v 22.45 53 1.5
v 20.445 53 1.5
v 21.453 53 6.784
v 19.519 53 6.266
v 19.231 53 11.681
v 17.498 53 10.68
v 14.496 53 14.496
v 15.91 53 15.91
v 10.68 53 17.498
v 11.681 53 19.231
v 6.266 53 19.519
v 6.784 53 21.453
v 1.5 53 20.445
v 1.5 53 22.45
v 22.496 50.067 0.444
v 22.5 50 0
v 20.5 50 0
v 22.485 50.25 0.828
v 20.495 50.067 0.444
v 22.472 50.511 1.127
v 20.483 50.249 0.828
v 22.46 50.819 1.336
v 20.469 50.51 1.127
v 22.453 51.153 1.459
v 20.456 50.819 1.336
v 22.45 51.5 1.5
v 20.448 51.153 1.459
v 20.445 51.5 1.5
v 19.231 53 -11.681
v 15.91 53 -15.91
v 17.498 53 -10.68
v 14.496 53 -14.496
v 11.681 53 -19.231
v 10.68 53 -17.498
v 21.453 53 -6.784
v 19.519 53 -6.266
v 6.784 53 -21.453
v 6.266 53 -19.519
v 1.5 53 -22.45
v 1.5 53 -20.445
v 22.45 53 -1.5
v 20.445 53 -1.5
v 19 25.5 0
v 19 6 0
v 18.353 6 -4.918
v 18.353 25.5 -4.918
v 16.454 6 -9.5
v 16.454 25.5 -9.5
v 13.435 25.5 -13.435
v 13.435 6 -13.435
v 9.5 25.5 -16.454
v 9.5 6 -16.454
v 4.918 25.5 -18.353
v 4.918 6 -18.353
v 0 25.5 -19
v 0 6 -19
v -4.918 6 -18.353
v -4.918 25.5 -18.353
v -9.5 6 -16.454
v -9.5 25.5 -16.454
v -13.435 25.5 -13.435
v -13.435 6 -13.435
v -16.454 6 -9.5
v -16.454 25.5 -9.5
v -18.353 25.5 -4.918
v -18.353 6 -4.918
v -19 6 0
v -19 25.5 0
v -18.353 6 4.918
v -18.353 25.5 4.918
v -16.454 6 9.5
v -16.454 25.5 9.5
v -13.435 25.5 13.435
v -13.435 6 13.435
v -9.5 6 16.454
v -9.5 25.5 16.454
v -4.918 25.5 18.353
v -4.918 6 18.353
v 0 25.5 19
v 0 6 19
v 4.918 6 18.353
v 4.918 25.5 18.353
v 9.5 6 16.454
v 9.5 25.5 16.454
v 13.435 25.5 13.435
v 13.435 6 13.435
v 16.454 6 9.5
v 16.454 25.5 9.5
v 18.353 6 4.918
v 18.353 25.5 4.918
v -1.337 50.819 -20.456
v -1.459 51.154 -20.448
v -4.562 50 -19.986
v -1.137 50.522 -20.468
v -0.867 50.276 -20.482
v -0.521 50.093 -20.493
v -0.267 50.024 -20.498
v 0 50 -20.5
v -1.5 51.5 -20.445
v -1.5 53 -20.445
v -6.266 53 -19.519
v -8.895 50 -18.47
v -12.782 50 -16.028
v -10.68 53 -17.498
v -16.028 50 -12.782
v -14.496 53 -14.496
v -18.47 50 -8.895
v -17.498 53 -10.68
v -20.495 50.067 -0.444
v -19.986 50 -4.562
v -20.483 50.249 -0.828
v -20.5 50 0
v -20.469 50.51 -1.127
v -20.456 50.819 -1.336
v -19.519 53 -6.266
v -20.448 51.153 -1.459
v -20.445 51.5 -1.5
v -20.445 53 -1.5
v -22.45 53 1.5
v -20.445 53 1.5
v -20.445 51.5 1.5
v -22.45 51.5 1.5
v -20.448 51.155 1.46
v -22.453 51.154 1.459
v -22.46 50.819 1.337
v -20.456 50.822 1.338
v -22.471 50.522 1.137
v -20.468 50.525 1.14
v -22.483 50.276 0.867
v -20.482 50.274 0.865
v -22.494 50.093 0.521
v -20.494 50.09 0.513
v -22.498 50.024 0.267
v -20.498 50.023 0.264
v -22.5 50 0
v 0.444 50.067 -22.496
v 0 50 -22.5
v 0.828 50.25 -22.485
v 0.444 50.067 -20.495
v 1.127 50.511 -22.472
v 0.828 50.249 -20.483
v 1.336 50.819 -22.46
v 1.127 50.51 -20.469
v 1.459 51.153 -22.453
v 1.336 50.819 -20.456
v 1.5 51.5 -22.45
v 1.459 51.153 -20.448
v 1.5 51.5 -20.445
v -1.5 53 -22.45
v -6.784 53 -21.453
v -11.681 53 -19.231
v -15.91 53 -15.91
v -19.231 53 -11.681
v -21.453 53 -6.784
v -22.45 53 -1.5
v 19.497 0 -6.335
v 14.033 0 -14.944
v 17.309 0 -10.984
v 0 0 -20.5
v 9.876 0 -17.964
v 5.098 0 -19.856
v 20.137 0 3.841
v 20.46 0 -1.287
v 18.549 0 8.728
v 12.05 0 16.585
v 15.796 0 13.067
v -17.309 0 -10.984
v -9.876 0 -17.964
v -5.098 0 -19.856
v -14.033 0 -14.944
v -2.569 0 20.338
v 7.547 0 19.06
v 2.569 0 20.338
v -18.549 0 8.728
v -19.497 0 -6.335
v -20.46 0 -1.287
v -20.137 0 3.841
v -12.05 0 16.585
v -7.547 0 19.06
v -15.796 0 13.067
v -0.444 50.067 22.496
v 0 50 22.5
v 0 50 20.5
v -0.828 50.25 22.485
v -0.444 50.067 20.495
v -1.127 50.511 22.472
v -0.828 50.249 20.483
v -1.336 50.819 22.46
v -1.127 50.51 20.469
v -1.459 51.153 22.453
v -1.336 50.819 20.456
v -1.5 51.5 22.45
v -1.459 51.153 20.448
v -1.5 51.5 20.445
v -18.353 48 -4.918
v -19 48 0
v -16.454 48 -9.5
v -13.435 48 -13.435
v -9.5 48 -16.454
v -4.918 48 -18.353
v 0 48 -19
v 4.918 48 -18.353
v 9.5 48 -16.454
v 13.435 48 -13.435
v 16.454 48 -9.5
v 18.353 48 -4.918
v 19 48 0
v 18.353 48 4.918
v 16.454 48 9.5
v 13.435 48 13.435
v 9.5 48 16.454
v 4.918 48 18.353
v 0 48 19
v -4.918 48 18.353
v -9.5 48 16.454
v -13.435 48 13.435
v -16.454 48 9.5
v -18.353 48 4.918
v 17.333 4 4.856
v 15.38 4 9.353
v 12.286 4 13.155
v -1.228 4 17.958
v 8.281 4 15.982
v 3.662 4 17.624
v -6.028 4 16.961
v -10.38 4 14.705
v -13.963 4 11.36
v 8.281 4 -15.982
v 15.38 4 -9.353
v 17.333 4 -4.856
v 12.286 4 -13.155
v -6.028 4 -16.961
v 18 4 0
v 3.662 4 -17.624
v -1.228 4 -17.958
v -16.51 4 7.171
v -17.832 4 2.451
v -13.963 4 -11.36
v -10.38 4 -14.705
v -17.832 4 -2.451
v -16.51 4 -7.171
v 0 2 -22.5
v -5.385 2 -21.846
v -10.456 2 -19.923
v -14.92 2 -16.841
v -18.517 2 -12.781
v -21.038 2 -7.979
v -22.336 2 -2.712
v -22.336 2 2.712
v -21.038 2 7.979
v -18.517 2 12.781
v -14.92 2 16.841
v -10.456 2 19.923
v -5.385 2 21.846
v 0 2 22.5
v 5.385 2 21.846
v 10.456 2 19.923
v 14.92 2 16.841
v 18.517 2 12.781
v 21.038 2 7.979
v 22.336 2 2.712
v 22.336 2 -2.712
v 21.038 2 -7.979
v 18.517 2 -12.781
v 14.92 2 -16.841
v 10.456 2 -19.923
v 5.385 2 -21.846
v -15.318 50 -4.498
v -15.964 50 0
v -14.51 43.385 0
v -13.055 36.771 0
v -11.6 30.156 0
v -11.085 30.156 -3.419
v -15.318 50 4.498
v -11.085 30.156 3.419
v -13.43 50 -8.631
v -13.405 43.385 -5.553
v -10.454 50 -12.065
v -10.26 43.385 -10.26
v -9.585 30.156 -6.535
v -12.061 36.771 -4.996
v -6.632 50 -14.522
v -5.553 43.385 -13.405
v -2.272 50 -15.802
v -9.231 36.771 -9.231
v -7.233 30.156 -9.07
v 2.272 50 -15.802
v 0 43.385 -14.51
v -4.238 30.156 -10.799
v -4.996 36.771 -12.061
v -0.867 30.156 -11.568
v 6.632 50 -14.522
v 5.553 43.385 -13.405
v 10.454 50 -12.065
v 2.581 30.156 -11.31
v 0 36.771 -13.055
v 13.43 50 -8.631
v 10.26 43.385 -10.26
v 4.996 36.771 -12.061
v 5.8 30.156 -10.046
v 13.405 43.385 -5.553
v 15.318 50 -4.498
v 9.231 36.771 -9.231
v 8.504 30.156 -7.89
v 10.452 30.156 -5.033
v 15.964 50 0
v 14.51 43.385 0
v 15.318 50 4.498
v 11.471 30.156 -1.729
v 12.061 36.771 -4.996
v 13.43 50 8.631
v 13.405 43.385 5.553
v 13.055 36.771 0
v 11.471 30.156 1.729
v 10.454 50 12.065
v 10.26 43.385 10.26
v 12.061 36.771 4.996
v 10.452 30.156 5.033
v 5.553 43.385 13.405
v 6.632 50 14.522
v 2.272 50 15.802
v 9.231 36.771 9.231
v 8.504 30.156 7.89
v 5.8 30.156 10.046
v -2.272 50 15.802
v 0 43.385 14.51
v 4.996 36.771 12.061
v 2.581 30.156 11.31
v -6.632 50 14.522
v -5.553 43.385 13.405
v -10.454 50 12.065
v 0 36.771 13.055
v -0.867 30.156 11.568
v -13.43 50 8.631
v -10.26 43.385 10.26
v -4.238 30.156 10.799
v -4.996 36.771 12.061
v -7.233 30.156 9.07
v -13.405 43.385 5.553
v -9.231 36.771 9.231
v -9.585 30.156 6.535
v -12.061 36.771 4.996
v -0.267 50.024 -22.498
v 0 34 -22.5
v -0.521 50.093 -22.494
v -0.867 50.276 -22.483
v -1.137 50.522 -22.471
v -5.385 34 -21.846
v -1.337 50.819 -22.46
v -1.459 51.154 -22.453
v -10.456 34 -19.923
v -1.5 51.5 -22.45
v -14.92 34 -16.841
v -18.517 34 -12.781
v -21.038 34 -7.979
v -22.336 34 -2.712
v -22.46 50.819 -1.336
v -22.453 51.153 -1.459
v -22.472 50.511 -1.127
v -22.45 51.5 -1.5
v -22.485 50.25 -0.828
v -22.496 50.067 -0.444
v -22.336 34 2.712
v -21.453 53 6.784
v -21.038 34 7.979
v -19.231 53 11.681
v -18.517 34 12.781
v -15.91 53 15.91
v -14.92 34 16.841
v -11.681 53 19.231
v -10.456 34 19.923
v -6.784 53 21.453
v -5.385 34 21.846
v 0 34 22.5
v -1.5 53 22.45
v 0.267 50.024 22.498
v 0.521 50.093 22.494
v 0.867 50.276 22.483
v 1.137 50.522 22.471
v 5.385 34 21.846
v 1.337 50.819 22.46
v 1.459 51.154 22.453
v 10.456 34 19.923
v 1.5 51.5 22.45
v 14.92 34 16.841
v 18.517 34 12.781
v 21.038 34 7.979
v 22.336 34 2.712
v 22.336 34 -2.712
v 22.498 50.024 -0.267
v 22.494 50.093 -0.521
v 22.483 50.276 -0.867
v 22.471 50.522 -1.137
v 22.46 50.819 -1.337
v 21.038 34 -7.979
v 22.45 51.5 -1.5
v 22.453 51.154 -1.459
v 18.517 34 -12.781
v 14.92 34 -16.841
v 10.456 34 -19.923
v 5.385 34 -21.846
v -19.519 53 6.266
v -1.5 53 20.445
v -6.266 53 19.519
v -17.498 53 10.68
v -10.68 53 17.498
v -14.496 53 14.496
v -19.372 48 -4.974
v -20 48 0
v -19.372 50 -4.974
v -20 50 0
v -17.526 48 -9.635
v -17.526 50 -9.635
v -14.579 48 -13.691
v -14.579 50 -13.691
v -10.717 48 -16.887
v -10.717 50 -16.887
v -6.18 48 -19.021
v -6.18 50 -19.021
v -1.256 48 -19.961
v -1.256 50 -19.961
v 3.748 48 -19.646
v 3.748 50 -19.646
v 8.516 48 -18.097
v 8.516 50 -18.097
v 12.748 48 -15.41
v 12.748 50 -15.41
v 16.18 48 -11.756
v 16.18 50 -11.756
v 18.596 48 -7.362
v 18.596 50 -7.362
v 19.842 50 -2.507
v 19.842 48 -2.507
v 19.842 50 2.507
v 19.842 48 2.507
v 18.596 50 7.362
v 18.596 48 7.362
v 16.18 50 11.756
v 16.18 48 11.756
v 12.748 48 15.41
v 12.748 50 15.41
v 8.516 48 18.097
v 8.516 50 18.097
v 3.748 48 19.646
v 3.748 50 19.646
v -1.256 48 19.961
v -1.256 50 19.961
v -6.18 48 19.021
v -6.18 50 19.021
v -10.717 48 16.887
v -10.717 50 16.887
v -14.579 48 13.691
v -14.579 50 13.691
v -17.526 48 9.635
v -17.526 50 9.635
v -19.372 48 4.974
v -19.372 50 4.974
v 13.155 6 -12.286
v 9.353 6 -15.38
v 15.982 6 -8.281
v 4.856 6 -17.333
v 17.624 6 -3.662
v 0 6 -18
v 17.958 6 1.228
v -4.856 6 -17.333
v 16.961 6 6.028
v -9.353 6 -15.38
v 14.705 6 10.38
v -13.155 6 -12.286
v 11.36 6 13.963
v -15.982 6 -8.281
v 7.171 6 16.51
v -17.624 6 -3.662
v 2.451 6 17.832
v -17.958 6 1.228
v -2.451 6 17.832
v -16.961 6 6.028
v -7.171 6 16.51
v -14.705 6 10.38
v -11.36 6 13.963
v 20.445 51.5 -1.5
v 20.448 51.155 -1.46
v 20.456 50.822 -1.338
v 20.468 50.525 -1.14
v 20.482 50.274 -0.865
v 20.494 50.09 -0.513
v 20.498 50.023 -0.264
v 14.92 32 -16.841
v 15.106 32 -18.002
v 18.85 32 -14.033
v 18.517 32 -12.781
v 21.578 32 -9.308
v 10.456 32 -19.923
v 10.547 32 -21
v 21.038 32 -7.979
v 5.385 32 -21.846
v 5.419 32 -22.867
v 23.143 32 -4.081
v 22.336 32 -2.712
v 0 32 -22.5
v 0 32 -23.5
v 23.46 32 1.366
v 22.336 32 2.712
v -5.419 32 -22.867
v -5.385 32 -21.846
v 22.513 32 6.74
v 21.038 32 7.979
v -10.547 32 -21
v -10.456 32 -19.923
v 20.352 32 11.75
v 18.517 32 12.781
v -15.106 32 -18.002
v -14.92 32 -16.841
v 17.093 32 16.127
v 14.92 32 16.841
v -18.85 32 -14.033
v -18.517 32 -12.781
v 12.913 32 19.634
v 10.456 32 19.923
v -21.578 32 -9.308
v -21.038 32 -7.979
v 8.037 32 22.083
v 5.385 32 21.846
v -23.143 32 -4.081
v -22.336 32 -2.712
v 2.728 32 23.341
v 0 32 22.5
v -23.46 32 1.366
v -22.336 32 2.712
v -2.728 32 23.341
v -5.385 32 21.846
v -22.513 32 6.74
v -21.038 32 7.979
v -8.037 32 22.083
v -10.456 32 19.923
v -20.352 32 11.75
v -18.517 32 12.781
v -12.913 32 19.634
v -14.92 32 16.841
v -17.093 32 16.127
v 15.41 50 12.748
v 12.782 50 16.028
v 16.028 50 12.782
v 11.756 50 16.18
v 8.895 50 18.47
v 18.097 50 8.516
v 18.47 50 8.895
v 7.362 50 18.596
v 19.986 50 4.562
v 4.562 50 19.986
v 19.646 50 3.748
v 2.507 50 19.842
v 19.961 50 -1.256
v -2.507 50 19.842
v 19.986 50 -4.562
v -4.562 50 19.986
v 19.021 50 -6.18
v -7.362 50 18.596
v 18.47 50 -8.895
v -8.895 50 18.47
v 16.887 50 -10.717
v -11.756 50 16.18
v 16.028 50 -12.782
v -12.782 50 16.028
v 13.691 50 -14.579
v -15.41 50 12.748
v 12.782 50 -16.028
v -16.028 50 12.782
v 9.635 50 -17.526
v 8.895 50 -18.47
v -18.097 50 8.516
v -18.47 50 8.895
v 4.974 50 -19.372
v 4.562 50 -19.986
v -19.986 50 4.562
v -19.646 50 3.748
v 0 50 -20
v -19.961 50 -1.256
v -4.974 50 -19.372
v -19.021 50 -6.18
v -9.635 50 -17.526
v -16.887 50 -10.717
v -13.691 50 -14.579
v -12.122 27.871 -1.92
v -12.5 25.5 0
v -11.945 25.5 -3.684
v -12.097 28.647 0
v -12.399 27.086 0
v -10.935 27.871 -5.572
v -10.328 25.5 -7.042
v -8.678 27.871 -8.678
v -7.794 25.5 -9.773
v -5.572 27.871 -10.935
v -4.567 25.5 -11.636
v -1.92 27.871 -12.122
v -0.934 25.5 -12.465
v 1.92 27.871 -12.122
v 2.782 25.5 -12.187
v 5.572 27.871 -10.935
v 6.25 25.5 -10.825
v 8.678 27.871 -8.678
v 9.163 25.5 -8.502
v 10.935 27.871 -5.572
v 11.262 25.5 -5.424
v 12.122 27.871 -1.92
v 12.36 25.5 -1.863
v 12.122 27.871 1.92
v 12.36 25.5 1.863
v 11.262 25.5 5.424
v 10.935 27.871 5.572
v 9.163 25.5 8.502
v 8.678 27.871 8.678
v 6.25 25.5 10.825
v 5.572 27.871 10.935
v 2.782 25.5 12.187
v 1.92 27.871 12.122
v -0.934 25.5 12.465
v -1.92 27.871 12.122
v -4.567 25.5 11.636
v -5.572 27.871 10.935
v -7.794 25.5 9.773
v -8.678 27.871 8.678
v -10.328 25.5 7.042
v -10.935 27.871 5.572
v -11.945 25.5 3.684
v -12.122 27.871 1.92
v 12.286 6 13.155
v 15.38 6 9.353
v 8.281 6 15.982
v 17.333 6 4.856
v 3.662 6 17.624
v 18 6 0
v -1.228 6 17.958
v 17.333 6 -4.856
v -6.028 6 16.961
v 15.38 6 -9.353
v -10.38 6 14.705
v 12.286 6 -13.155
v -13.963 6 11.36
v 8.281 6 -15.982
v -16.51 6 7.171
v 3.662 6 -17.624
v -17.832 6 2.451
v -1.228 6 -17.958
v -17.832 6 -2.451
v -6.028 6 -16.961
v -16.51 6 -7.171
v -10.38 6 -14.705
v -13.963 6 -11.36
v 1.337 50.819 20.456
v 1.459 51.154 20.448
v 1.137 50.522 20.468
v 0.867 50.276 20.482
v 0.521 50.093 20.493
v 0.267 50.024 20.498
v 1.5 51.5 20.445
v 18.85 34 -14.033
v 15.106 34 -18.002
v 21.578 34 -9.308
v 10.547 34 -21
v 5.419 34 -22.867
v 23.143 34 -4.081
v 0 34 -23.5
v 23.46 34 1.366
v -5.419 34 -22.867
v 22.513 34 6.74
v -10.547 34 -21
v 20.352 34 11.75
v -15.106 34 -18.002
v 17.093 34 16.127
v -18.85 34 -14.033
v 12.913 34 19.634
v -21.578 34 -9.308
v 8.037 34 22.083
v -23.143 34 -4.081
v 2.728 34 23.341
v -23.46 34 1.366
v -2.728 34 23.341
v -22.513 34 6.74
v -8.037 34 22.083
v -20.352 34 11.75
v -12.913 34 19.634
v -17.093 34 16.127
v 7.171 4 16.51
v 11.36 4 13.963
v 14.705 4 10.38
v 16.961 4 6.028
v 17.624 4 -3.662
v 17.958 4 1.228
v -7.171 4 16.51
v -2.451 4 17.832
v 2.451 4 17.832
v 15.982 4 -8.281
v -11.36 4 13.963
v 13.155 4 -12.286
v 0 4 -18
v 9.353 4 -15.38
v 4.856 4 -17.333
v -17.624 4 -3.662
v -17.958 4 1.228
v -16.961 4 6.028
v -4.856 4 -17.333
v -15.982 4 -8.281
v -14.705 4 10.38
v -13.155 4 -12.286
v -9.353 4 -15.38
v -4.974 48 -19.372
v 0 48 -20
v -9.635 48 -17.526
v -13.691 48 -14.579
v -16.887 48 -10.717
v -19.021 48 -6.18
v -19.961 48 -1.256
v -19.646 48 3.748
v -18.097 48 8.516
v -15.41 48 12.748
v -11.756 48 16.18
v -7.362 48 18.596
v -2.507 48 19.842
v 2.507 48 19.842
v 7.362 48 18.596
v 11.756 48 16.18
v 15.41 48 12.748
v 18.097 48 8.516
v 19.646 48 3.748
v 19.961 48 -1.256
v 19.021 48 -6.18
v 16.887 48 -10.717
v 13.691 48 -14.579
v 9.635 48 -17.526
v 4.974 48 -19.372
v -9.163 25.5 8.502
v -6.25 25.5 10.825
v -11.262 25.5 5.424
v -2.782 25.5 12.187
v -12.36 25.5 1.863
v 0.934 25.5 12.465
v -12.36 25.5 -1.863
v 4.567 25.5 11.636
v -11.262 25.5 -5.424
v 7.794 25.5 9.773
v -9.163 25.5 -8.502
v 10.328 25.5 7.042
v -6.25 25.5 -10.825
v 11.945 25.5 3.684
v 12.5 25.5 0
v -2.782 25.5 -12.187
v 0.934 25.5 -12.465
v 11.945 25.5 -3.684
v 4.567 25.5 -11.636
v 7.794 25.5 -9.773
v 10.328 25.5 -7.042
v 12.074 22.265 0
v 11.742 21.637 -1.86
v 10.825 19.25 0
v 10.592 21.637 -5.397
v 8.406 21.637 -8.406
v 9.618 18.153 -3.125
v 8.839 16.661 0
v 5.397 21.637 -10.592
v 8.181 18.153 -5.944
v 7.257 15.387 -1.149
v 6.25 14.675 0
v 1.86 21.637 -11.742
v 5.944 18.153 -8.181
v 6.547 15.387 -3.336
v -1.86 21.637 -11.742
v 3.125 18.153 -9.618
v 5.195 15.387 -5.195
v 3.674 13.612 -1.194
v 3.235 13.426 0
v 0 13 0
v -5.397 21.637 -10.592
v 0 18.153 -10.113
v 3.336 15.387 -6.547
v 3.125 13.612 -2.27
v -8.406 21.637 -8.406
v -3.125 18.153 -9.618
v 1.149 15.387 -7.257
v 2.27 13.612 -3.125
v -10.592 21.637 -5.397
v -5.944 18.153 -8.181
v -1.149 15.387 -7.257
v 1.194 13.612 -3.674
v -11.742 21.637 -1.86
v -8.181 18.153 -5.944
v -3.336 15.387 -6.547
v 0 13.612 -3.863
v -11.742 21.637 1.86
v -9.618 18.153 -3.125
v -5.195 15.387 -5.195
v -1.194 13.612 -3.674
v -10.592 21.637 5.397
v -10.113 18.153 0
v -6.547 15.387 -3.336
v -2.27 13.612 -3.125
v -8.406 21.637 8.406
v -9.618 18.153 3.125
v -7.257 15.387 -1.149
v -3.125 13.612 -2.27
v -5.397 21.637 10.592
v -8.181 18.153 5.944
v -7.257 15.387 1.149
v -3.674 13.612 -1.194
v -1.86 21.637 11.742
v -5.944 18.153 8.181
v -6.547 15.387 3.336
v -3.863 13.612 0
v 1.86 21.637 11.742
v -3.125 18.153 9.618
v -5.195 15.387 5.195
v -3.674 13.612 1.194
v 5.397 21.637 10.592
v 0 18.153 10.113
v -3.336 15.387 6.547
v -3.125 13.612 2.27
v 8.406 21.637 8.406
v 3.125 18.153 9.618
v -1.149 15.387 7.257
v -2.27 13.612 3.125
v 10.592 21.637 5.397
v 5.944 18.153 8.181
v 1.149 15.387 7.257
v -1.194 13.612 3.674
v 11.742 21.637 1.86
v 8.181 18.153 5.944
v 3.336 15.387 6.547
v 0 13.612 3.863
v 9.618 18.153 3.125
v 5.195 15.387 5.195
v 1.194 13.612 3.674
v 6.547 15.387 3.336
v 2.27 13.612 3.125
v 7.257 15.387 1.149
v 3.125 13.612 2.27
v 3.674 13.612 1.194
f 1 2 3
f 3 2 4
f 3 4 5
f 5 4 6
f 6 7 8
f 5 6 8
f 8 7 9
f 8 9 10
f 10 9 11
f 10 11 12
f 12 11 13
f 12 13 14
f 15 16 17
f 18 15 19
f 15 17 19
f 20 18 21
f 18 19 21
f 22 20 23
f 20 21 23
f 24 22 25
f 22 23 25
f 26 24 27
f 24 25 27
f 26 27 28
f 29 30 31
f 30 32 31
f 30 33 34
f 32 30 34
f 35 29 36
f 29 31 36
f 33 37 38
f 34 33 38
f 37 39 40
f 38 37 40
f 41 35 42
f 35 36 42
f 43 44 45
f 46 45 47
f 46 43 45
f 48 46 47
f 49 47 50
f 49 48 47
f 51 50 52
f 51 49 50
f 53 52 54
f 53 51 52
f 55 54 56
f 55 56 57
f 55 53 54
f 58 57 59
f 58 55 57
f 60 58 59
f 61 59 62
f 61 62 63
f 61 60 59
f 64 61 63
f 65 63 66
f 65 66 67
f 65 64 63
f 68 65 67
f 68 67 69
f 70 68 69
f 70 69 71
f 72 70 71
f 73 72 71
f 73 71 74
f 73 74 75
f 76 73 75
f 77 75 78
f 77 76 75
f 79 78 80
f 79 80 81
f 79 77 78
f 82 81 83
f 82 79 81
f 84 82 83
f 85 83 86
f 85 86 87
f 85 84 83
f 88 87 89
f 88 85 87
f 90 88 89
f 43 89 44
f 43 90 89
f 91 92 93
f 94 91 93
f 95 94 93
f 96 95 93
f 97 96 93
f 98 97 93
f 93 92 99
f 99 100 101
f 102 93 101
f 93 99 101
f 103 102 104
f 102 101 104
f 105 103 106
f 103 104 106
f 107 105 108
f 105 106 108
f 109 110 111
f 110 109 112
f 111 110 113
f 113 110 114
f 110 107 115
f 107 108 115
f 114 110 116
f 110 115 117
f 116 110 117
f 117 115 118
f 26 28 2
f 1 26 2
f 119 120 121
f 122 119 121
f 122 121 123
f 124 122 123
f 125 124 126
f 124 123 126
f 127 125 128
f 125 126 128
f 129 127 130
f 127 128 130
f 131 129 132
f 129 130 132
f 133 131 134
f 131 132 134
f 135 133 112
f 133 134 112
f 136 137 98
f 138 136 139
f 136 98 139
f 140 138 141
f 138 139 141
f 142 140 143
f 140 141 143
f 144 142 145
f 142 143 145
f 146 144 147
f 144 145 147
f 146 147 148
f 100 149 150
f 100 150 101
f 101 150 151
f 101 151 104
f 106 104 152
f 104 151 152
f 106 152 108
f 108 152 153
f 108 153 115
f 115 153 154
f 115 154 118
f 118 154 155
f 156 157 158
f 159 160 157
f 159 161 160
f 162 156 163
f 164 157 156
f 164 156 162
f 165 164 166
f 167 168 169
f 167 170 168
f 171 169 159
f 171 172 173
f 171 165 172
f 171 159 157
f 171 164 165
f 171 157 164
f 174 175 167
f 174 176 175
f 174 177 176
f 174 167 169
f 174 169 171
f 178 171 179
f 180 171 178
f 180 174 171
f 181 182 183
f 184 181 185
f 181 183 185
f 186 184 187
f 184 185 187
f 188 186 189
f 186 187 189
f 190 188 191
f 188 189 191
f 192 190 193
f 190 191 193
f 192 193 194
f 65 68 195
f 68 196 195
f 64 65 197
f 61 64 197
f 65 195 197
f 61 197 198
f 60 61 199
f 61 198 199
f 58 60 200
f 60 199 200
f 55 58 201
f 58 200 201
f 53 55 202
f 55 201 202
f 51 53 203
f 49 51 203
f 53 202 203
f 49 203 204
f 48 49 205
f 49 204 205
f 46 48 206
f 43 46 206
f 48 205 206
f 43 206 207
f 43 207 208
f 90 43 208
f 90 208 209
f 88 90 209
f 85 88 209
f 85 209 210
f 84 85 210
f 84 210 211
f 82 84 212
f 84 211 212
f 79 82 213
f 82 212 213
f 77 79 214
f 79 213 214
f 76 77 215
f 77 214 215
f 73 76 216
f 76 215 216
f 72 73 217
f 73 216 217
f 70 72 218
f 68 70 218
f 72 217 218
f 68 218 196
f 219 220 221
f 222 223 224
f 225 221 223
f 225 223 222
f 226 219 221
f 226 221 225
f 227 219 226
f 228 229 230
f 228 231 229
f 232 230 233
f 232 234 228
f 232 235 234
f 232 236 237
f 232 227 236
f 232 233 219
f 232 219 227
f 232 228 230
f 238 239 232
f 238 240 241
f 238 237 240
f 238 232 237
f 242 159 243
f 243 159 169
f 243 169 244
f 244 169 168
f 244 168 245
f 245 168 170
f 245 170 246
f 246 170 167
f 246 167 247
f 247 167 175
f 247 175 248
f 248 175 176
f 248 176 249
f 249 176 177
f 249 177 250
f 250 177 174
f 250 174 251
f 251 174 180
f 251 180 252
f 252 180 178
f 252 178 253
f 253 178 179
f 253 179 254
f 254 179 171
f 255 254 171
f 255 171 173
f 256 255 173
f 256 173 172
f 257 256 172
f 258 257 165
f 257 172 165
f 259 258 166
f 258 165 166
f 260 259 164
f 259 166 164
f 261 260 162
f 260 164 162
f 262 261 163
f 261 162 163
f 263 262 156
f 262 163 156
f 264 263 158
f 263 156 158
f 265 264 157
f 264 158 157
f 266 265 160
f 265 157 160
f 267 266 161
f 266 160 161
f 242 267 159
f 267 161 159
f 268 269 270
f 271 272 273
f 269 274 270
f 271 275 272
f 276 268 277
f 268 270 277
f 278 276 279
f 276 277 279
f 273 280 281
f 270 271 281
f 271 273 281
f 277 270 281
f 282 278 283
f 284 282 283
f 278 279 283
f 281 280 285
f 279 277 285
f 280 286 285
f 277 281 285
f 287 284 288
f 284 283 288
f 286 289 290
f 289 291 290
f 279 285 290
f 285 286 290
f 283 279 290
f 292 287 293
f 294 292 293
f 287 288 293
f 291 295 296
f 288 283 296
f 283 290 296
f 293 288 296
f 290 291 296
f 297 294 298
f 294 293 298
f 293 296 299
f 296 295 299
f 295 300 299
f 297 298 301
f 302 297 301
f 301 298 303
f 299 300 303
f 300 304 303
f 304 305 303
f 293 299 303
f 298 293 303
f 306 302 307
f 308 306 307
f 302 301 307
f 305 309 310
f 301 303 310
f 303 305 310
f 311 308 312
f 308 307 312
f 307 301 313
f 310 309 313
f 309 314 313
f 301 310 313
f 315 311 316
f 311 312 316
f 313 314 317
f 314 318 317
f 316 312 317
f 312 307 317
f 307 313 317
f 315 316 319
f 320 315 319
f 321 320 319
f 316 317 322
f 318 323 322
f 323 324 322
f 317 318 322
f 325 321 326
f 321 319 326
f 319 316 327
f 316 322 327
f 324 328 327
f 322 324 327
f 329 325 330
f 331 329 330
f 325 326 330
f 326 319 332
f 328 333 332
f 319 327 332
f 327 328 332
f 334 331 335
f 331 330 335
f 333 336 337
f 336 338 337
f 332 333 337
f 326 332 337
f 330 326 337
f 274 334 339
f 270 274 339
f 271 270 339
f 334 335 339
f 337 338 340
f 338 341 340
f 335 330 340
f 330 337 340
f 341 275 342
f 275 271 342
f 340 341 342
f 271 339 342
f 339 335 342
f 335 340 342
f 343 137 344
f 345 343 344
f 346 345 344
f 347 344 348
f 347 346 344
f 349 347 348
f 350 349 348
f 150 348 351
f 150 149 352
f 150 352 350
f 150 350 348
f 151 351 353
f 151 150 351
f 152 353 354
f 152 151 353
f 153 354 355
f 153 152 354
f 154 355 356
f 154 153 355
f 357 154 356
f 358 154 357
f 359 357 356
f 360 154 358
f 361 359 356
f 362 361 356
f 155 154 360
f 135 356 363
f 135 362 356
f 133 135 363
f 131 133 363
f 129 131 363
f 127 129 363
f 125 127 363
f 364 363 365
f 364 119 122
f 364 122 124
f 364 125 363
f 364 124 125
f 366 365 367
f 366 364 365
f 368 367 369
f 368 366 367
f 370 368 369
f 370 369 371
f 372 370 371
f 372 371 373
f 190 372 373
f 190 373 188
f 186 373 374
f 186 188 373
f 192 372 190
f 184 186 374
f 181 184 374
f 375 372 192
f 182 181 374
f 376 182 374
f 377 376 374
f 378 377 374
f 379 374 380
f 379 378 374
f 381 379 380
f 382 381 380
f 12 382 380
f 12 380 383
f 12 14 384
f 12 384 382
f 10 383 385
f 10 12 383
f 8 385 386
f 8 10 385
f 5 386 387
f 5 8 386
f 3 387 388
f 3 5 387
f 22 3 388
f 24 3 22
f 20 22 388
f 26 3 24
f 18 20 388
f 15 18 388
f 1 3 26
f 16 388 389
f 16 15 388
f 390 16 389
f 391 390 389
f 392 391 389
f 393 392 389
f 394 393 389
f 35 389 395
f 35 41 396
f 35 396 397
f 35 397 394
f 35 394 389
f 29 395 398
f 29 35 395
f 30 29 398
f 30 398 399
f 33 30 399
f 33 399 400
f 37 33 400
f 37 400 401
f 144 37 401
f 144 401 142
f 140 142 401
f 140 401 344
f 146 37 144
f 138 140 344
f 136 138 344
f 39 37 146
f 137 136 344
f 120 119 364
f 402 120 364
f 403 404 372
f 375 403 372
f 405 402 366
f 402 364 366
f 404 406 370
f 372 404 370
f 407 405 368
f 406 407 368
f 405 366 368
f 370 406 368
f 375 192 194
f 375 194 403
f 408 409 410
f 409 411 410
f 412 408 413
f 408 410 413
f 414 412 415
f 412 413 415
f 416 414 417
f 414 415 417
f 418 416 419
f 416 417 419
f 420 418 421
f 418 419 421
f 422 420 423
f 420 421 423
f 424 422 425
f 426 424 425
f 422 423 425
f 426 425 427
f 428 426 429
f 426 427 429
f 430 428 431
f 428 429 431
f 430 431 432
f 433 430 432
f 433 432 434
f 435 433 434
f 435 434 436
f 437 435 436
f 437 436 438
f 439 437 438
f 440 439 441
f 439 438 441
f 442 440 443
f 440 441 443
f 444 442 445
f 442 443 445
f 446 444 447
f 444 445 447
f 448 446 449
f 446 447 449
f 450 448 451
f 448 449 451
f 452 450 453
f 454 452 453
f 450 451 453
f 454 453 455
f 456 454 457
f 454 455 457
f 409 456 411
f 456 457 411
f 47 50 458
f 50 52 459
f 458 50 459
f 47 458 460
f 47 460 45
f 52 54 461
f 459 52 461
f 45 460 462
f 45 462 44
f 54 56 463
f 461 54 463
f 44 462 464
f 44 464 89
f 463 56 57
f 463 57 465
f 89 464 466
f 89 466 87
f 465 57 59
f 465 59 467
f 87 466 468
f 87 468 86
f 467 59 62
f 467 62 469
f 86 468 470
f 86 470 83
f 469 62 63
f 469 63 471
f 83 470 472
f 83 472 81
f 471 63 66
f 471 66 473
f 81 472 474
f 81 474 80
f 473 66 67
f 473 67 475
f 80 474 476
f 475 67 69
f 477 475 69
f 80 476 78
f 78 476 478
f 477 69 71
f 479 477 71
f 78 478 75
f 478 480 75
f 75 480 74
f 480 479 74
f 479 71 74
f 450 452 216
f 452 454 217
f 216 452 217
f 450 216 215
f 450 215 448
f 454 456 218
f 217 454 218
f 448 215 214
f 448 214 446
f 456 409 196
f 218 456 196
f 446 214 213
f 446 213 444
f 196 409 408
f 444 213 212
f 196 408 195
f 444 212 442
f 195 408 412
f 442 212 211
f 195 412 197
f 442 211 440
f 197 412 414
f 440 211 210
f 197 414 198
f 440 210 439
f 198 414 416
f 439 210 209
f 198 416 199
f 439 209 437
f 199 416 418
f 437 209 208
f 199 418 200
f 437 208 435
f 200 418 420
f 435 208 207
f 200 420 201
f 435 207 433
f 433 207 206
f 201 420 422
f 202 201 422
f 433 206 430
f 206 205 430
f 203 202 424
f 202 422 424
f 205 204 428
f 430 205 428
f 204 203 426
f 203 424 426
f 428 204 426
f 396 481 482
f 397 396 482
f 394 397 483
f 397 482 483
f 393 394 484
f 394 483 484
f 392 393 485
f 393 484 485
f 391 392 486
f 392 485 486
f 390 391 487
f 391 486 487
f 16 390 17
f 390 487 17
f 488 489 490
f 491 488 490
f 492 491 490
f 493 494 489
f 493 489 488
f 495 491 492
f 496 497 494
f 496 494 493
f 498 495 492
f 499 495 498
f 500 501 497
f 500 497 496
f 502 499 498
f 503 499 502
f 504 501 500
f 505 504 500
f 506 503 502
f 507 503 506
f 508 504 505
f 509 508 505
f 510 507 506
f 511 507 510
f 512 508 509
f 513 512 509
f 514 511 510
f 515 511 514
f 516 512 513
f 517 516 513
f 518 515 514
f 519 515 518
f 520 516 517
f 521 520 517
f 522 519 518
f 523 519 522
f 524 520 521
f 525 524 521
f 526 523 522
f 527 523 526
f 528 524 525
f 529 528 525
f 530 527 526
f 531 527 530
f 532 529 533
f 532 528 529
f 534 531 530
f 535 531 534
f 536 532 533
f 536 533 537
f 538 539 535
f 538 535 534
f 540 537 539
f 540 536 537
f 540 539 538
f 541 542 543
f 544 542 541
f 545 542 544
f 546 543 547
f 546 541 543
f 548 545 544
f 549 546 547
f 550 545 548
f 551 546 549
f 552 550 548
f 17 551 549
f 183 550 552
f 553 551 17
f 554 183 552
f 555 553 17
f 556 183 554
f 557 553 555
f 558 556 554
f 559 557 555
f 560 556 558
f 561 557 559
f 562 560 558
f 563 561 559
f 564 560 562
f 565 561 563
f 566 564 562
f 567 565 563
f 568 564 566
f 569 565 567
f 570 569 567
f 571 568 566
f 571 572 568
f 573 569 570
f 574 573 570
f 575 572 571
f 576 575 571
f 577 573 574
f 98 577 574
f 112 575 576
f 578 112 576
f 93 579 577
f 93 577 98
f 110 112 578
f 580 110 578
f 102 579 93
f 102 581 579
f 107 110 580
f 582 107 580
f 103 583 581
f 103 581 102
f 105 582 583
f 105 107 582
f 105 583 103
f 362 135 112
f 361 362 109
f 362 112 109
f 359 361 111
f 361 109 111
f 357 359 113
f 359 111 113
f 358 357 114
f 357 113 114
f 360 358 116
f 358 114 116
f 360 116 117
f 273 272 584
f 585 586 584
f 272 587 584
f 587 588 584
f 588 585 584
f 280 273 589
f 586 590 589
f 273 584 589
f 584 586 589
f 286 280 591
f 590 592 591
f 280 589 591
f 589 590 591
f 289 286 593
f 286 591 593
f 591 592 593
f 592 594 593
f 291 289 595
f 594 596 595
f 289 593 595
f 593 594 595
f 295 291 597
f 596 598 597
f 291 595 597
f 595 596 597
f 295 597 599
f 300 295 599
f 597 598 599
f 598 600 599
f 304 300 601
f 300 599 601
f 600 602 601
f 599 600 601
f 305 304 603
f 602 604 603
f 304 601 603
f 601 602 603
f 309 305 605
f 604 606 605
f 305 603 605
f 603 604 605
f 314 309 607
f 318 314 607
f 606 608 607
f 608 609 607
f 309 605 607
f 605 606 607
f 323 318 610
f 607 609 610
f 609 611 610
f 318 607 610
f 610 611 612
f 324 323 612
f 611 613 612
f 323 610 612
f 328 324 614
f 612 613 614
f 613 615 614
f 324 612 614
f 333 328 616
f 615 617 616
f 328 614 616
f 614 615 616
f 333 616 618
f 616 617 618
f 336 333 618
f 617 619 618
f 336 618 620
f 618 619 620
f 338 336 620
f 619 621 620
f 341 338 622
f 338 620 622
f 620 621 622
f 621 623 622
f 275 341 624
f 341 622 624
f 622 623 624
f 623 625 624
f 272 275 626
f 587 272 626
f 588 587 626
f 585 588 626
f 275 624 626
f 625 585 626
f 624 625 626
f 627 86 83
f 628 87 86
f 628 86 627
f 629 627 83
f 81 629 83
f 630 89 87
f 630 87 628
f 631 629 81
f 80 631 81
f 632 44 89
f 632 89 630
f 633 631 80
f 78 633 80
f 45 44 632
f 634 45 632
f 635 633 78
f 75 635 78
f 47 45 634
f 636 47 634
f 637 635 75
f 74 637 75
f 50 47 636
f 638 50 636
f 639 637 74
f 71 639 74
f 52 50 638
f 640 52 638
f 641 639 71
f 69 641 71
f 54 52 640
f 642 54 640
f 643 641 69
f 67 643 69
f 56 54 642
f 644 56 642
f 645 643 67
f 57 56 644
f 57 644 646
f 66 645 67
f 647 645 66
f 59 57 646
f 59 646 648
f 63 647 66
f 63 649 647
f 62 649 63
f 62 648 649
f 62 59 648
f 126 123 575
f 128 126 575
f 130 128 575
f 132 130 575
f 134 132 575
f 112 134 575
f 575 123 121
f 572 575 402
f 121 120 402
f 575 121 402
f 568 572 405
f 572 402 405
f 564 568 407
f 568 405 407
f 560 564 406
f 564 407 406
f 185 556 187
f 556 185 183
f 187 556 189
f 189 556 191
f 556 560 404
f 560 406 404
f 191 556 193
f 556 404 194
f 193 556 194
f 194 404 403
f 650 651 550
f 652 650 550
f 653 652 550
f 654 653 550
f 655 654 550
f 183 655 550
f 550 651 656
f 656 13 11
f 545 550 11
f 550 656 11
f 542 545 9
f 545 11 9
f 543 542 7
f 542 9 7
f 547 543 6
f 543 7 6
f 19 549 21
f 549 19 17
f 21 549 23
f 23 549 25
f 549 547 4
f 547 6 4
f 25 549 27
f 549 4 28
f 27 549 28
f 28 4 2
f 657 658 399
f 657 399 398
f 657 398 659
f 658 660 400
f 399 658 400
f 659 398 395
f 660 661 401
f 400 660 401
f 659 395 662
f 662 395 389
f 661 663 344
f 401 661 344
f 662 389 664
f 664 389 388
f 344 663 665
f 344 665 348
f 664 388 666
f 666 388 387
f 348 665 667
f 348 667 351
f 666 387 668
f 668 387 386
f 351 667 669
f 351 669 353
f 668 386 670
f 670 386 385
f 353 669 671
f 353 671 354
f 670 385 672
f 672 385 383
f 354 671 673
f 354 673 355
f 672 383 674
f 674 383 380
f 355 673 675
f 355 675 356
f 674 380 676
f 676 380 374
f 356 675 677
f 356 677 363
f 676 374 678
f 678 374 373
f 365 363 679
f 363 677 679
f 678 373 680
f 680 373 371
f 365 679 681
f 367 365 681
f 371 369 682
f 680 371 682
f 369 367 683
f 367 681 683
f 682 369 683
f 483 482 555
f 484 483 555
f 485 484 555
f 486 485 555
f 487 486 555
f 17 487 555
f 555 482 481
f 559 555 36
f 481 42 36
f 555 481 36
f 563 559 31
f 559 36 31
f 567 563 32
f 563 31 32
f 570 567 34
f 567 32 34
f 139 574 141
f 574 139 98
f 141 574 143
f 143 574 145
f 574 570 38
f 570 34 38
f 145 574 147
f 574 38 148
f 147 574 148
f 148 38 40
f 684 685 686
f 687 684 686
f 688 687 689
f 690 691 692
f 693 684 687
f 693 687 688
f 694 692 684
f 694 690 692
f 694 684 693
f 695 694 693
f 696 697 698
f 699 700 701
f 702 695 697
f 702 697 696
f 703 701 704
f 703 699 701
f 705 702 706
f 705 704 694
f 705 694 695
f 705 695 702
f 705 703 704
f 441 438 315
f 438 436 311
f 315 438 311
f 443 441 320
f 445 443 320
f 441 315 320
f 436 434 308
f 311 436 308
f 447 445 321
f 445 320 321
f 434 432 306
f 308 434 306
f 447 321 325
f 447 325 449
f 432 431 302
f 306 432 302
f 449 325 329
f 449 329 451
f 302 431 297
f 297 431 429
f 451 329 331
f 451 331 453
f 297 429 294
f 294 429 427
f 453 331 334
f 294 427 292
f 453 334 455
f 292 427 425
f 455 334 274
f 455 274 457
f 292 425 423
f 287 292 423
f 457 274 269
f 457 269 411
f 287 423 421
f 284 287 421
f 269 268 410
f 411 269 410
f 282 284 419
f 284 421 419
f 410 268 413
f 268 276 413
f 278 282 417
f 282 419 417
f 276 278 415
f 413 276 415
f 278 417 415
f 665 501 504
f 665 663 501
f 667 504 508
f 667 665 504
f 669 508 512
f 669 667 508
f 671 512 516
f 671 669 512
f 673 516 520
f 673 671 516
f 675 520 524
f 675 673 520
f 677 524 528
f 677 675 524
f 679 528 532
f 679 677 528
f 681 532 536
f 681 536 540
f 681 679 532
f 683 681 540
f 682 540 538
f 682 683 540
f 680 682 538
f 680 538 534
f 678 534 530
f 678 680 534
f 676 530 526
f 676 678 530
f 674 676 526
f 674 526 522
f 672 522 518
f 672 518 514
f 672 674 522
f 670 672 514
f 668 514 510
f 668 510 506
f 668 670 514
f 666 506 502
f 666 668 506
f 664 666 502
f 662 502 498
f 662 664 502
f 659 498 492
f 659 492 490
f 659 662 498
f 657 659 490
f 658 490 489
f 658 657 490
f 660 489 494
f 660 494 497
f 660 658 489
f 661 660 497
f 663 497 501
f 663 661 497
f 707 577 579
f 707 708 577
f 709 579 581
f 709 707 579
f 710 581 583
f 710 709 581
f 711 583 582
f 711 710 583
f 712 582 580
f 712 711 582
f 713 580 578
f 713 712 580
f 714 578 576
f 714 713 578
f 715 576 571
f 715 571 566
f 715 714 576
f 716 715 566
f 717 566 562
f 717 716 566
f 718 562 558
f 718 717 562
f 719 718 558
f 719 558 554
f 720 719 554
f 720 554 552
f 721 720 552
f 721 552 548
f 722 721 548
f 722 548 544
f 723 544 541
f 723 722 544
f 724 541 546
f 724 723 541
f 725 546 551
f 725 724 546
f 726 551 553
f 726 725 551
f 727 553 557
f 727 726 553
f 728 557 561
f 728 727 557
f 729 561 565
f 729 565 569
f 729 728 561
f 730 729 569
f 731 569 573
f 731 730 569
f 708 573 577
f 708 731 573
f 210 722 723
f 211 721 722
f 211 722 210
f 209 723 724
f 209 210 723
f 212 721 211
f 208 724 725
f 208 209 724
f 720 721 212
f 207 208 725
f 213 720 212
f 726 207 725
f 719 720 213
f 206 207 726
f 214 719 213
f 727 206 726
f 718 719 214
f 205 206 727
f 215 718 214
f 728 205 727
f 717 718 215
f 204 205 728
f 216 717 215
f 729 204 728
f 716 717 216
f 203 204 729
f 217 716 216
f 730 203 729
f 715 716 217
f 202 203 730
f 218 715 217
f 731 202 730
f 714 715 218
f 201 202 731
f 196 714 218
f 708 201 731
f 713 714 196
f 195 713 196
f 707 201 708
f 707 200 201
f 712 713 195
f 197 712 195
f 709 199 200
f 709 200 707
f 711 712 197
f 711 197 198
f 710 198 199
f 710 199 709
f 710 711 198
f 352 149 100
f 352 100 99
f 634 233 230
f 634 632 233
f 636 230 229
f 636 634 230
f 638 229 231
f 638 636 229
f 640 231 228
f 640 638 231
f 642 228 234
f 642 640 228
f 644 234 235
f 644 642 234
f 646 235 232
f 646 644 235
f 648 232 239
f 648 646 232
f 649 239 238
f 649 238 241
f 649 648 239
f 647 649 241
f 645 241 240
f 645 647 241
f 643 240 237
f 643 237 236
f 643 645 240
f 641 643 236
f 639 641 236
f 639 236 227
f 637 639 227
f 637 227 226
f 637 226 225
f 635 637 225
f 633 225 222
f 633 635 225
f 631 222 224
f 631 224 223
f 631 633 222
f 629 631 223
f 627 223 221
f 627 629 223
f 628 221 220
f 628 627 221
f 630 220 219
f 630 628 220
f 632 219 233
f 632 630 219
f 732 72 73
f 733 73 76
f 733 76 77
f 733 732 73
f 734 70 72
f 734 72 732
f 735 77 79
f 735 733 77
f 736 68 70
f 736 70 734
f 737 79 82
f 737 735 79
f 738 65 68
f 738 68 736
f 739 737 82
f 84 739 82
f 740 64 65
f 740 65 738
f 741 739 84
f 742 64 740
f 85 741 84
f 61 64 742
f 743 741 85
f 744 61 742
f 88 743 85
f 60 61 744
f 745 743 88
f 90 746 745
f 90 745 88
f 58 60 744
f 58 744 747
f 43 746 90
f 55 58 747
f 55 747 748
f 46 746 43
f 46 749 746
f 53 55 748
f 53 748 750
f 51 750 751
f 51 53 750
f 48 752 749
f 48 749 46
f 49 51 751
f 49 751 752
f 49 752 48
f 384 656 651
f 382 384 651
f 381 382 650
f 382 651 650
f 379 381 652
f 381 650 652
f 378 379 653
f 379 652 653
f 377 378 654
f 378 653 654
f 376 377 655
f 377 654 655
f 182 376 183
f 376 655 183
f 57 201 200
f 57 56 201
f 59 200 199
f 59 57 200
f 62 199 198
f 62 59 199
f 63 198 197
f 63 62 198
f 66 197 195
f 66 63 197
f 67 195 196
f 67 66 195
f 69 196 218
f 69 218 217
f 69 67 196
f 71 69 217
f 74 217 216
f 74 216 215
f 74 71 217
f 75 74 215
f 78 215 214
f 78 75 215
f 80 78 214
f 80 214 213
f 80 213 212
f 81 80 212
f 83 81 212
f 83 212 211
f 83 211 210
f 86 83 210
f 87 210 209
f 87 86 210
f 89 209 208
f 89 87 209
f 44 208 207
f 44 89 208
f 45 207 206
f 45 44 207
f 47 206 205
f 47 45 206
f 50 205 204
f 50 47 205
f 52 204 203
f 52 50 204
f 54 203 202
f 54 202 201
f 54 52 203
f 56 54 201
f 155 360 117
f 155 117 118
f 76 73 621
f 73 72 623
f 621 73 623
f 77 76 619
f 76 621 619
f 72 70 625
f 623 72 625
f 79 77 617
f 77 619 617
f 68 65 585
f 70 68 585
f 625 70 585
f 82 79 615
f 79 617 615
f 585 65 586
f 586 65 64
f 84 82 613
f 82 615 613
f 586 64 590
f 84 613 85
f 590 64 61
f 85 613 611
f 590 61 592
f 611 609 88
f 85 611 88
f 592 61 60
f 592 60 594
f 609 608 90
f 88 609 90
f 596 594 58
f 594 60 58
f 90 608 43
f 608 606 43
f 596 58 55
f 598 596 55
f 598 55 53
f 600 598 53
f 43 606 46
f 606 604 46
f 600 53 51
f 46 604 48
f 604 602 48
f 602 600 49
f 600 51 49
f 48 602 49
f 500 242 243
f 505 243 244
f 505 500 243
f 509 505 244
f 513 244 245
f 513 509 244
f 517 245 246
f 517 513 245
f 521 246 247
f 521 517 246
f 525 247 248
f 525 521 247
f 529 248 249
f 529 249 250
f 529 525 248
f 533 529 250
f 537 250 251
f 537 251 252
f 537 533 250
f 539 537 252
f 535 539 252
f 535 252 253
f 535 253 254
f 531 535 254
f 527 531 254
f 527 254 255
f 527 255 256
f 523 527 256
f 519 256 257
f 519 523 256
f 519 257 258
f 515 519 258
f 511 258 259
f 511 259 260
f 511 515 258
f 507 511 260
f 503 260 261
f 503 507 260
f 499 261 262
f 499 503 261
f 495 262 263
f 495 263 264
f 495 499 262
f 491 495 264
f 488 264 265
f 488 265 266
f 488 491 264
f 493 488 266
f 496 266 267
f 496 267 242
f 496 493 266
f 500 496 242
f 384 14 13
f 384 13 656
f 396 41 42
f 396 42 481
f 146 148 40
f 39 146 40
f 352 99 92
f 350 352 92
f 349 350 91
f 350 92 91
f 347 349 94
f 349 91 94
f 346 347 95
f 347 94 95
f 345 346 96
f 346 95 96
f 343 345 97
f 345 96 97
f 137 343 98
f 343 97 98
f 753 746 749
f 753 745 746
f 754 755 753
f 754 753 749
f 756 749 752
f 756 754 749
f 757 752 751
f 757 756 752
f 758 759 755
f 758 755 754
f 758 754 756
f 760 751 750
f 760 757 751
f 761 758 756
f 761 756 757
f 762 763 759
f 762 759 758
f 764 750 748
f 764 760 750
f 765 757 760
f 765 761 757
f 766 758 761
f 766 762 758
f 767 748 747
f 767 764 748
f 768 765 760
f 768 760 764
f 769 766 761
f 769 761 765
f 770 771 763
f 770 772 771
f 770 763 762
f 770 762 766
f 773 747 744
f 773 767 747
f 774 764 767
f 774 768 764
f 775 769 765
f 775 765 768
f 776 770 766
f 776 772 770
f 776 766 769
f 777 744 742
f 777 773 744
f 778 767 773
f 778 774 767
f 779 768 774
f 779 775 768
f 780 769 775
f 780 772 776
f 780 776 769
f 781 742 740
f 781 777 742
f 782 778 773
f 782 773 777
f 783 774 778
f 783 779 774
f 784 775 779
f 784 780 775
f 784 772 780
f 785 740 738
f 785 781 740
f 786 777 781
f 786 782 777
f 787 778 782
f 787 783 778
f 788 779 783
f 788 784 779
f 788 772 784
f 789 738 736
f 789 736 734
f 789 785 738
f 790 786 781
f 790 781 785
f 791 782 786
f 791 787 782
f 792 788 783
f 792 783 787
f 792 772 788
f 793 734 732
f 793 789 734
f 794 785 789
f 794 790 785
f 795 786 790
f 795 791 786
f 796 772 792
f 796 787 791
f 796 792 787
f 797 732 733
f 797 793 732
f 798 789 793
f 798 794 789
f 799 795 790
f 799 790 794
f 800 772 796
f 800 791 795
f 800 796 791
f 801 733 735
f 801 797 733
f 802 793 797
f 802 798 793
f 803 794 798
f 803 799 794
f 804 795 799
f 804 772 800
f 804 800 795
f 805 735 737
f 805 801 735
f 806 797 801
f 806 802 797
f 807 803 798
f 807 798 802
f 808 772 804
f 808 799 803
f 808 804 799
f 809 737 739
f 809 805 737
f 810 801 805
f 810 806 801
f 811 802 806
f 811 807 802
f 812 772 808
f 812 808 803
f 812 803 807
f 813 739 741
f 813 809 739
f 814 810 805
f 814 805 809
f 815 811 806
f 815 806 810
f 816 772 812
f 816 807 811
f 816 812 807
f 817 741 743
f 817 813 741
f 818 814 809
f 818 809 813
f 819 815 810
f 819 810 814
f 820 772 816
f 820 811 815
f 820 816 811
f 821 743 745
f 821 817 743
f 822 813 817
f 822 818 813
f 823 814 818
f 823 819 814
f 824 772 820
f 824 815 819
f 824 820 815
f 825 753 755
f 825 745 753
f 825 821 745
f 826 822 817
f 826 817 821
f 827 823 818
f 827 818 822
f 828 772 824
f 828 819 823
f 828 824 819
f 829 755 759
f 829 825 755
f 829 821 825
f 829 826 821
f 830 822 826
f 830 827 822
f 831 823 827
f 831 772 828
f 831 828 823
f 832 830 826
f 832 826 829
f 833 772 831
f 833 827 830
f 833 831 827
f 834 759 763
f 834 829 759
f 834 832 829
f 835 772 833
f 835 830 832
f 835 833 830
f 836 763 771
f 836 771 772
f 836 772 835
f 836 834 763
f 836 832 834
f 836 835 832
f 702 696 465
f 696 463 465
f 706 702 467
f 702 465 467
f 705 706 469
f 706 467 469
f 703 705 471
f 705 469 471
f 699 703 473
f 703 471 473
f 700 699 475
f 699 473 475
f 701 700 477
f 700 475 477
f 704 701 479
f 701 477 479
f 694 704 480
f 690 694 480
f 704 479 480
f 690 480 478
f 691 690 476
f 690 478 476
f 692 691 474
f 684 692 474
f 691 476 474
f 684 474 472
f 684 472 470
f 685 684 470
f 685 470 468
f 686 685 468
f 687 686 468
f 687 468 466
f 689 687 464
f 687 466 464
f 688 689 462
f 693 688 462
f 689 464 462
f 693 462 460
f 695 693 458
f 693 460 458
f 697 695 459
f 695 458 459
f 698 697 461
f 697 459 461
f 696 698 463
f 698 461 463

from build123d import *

# Parameters (mm, degrees)
SKETCH_1_W               = 1
SKETCH_1_H               = 2
SKETCH_1_W_2             = 2
SKETCH_1_H_2             = 3
CUT_EXTRUDE_1_REACH      = 64.558
CUT_EXTRUDE_1_END_RADIUS = 22.5
PATTERN_CIRCULAR_1_COUNT = 4
CHAMFER_1_SIZE           = 2


with BuildPart() as part:
    # 草图1 → Revolve 2249 (revolve)
    with BuildSketch(Plane.XY, mode=Mode.PRIVATE) as revolve_2249_sk:
        Polygon((19, 4), (0, 4), (0, 0), (22.5, 0), (22.5, 50), (20, 50), (20, 48), (19, 48), align=None)
        with Locations((18.5, 5)):
            Rectangle(SKETCH_1_W, SKETCH_1_H)
        with Locations((21.5, 51.5)):
            Rectangle(SKETCH_1_W_2, SKETCH_1_H_2)
        with Locations((23, 33)):
            Rectangle(SKETCH_1_W, SKETCH_1_H)
    revolve(revolve_2249_sk.sketch.rotate(Axis((0, 0, 0), (0, 1, 0)), 90), axis=Axis((0, 0, 0), (0, 1, 0)))

    # 切除-拉伸1: up to this cylinder (the profile starts inside it)
    cut_extrude_1_end = Plane(origin=(0, 51.640025, 0), z_dir=(0, -1, 0)) * Cylinder(CUT_EXTRUDE_1_END_RADIUS, 175.116, mode=Mode.PRIVATE)
    # 草图4 → 切除-拉伸1 (cut, up to the surface)
    with BuildSketch(Plane.XY, mode=Mode.PRIVATE) as cut_extrude_1_sk1:
        with BuildLine():
            Line((0, 50), (0, 53))
            Line((0, 53), (-1.5, 53))
            Line((-1.5, 53), (-1.5, 51.5))
            ThreePointArc((-1.5, 51.5), (-1.060660172, 50.439339828), (0, 50))
        make_face()
    cut_extrude_1_tool1 = extrude(cut_extrude_1_sk1.sketch, amount=-CUT_EXTRUDE_1_REACH, mode=Mode.PRIVATE) & cut_extrude_1_end
    # 草图4 → 切除-拉伸1 (cut, up to the surface)
    with BuildSketch(Plane.XY, mode=Mode.PRIVATE) as cut_extrude_1_sk2:
        with BuildLine():
            Line((1.5, 53), (0, 53))
            Line((0, 53), (0, 50))
            ThreePointArc((0, 50), (1.060660172, 50.439339828), (1.5, 51.5))
            Line((1.5, 51.5), (1.5, 53))
        make_face()
    cut_extrude_1_tool2 = extrude(cut_extrude_1_sk2.sketch, amount=-CUT_EXTRUDE_1_REACH, mode=Mode.PRIVATE) & cut_extrude_1_end
    cut_extrude_1 = cut_extrude_1_tool1.solids().sort_by_distance((-0.700124, 51.640025, 0))[0] + cut_extrude_1_tool2.solids().sort_by_distance((0.700124, 51.640025, 0))[0]
    add(cut_extrude_1, mode=Mode.SUBTRACT)

    # 阵列(圆周)1: 切除-拉伸1 ×4 about axis
    pattern_circular_1_axis = Axis((0, 0, 0), (0, 1, 0))
    for i in range(1, PATTERN_CIRCULAR_1_COUNT):
        add(cut_extrude_1.rotate(pattern_circular_1_axis, i * 360 / PATTERN_CIRCULAR_1_COUNT), mode=Mode.SUBTRACT)

    # 倒角1
    chamfer_1_edges = [part.edges().sort_by_distance(p)[0] for p in [
        (0, 0, 22.5),
    ]]
    chamfer(chamfer_1_edges, length=CHAMFER_1_SIZE)


with BuildPart() as body_2:
    # 草图2 → Revolve 2487 (revolve)
    with BuildSketch(Plane.XY):
        with BuildLine():
            Line((19, 13), (19, 25.5))
            Line((19, 25.5), (12.5, 25.5))
            ThreePointArc((12.5, 25.5), (8.838834765, 16.661165235), (0, 13))
            Line((0, 13), (0, 4))
            Line((0, 4), (18, 4))
            Line((18, 4), (18, 6))
            Line((18, 6), (19, 6))
            Line((19, 6), (19, 13))
        make_face()
    revolve(axis=Axis((0, 0, 0), (0, 1, 0)))


with BuildPart() as body_3:
    # 草图3 → Revolve 2685 (revolve)
    with BuildSketch(Plane.XY, mode=Mode.PRIVATE) as revolve_2685_sk:
        with BuildLine():
            Line((19, 48), (20, 48))
            Line((20, 48), (20, 50))
            Line((20, 50), (15.964343174, 50))
            Line((15.964343174, 50), (11.600401101, 30.156253246))
            ThreePointArc((11.600401101, 30.156253246), (12.273039839, 27.871179689), (12.5, 25.5))
            Line((12.5, 25.5), (19, 25.5))
            Line((19, 25.5), (19, 48))
        make_face()
    revolve(revolve_2685_sk.sketch.rotate(Axis((0, 50, 0), (0, -1, 0)), 180), axis=Axis((0, 50, 0), (0, -1, 0)))


solid = Compound([part.part, body_2.part, body_3.part])
